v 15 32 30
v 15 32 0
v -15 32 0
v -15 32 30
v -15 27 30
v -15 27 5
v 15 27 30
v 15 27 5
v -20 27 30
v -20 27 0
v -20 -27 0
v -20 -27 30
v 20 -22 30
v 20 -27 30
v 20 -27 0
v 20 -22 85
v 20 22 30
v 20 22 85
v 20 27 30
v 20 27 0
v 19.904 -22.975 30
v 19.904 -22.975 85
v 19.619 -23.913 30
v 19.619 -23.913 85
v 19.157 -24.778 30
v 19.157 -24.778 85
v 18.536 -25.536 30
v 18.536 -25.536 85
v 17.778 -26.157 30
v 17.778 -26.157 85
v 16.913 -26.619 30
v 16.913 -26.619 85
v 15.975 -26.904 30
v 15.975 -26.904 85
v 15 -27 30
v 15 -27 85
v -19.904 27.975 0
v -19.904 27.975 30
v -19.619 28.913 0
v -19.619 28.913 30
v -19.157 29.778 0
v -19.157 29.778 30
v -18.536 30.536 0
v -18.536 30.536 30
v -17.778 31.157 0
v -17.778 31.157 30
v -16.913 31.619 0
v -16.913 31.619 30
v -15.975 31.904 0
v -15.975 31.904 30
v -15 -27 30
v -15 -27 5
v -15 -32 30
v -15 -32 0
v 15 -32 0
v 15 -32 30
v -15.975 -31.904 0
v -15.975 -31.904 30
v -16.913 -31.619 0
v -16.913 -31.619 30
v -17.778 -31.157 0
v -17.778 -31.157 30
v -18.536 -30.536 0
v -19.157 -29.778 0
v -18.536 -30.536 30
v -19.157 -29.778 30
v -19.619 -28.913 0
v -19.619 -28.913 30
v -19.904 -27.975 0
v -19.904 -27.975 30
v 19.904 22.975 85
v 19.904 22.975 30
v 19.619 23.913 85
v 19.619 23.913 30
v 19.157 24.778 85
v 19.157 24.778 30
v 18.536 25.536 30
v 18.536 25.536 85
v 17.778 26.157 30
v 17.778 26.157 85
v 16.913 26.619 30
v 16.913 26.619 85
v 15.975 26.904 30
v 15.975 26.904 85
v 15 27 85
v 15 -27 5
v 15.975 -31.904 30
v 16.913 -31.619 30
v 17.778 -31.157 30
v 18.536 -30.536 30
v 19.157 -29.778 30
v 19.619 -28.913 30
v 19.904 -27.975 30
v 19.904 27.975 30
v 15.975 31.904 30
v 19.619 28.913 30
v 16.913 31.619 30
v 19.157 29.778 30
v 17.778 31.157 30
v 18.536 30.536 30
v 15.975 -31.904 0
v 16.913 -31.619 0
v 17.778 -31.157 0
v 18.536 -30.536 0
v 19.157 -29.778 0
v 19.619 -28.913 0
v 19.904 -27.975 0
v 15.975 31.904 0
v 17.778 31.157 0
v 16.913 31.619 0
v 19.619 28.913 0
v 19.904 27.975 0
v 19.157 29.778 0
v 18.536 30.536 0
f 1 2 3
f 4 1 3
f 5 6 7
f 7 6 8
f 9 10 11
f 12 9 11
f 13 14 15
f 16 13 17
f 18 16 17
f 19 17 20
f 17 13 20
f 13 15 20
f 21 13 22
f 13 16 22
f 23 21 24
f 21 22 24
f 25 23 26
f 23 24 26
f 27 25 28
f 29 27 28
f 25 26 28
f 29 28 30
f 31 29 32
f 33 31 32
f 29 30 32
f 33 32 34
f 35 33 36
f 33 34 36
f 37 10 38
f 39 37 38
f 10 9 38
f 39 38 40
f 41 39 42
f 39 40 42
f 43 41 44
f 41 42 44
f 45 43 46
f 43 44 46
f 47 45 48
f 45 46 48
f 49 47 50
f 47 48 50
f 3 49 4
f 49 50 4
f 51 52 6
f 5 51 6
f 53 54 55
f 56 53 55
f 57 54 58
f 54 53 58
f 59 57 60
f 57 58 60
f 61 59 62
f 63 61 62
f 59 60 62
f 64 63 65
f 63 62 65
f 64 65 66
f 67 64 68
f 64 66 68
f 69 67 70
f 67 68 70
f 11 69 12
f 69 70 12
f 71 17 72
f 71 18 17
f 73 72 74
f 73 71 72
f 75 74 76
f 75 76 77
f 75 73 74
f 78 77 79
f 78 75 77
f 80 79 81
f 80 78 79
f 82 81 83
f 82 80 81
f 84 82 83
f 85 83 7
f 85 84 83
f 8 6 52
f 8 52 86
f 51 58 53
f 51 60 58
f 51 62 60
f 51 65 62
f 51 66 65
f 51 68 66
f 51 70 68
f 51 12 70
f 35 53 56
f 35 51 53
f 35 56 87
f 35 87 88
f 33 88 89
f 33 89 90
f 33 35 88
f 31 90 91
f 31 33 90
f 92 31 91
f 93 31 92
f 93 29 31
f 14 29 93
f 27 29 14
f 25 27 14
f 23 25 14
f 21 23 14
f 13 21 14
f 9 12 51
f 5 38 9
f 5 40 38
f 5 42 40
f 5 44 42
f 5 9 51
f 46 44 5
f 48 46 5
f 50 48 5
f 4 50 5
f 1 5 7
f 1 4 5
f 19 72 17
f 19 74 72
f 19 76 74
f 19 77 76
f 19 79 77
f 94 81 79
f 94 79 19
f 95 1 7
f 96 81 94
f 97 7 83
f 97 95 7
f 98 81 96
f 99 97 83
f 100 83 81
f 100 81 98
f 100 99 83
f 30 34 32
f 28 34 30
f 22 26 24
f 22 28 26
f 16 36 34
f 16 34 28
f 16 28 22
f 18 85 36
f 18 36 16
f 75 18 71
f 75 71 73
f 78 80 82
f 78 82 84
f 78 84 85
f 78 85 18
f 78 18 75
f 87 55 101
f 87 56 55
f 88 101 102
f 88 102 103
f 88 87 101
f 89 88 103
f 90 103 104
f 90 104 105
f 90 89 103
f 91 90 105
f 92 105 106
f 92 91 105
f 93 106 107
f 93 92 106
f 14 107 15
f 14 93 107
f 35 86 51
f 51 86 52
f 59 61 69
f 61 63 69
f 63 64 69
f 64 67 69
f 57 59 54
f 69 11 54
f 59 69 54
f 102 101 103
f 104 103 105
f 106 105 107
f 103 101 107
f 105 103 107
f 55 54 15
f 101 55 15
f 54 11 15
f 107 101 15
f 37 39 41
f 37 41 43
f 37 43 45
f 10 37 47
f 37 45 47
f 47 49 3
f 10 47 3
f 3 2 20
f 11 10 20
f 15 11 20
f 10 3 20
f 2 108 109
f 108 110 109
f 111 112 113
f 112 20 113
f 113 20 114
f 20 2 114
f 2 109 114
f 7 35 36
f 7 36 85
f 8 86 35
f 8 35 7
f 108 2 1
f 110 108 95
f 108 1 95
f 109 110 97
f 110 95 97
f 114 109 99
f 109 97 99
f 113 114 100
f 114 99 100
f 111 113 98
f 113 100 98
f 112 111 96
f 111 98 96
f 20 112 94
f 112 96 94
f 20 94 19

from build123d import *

# Parameters (mm, degrees)
F0_W     = 5
F0_H     = 54
F1_DEPTH = 85
F0_W_2   = 30
F2_DEPTH = 5
F3_DEPTH = 30
F4_R     = 4.99999


# Not quite as in the source:
# - a fillet or chamfer is up to 0.001 mm smaller than in the source, because OpenCascade refuses the exact size


with BuildPart() as f1:
    # F0 (on Top) → F1 (new body)
    with BuildSketch(Plane.XY):
        with Locations((17.5, 0)):
            Rectangle(F0_W, F0_H)
    extrude(amount=F1_DEPTH)

    # F0 (on Top) → F2 (join)
    with BuildSketch(Plane.XY):
        Rectangle(F0_W_2, F0_H)
    extrude(amount=F2_DEPTH)

    # F0 (on Top) → F3 (join)
    with BuildSketch(Plane.XY):
        Polygon((20, -27), (15, -27), (-15, -27), (-15, 27), (15, 27), (20, 27), (20, 32), (-20, 32), (-20, -31.9579449729), (-20, -32), (20, -32), align=None)
    extrude(amount=F3_DEPTH)

    # F4 (radius 5 in the source; OpenCascade refuses exactly that, so slightly less here)
    f4_edges = [f1.edges().sort_by_distance(p)[0] for p in [
        (-20, -32, 15),
        (20, -32, 15),
        (20, 32, 15),
        (-20, 32, 15),
        (20, 27, 57.5),
        (20, -27, 57.5),
    ]]
    fillet(f4_edges, radius=F4_R)


solid = f1.part
